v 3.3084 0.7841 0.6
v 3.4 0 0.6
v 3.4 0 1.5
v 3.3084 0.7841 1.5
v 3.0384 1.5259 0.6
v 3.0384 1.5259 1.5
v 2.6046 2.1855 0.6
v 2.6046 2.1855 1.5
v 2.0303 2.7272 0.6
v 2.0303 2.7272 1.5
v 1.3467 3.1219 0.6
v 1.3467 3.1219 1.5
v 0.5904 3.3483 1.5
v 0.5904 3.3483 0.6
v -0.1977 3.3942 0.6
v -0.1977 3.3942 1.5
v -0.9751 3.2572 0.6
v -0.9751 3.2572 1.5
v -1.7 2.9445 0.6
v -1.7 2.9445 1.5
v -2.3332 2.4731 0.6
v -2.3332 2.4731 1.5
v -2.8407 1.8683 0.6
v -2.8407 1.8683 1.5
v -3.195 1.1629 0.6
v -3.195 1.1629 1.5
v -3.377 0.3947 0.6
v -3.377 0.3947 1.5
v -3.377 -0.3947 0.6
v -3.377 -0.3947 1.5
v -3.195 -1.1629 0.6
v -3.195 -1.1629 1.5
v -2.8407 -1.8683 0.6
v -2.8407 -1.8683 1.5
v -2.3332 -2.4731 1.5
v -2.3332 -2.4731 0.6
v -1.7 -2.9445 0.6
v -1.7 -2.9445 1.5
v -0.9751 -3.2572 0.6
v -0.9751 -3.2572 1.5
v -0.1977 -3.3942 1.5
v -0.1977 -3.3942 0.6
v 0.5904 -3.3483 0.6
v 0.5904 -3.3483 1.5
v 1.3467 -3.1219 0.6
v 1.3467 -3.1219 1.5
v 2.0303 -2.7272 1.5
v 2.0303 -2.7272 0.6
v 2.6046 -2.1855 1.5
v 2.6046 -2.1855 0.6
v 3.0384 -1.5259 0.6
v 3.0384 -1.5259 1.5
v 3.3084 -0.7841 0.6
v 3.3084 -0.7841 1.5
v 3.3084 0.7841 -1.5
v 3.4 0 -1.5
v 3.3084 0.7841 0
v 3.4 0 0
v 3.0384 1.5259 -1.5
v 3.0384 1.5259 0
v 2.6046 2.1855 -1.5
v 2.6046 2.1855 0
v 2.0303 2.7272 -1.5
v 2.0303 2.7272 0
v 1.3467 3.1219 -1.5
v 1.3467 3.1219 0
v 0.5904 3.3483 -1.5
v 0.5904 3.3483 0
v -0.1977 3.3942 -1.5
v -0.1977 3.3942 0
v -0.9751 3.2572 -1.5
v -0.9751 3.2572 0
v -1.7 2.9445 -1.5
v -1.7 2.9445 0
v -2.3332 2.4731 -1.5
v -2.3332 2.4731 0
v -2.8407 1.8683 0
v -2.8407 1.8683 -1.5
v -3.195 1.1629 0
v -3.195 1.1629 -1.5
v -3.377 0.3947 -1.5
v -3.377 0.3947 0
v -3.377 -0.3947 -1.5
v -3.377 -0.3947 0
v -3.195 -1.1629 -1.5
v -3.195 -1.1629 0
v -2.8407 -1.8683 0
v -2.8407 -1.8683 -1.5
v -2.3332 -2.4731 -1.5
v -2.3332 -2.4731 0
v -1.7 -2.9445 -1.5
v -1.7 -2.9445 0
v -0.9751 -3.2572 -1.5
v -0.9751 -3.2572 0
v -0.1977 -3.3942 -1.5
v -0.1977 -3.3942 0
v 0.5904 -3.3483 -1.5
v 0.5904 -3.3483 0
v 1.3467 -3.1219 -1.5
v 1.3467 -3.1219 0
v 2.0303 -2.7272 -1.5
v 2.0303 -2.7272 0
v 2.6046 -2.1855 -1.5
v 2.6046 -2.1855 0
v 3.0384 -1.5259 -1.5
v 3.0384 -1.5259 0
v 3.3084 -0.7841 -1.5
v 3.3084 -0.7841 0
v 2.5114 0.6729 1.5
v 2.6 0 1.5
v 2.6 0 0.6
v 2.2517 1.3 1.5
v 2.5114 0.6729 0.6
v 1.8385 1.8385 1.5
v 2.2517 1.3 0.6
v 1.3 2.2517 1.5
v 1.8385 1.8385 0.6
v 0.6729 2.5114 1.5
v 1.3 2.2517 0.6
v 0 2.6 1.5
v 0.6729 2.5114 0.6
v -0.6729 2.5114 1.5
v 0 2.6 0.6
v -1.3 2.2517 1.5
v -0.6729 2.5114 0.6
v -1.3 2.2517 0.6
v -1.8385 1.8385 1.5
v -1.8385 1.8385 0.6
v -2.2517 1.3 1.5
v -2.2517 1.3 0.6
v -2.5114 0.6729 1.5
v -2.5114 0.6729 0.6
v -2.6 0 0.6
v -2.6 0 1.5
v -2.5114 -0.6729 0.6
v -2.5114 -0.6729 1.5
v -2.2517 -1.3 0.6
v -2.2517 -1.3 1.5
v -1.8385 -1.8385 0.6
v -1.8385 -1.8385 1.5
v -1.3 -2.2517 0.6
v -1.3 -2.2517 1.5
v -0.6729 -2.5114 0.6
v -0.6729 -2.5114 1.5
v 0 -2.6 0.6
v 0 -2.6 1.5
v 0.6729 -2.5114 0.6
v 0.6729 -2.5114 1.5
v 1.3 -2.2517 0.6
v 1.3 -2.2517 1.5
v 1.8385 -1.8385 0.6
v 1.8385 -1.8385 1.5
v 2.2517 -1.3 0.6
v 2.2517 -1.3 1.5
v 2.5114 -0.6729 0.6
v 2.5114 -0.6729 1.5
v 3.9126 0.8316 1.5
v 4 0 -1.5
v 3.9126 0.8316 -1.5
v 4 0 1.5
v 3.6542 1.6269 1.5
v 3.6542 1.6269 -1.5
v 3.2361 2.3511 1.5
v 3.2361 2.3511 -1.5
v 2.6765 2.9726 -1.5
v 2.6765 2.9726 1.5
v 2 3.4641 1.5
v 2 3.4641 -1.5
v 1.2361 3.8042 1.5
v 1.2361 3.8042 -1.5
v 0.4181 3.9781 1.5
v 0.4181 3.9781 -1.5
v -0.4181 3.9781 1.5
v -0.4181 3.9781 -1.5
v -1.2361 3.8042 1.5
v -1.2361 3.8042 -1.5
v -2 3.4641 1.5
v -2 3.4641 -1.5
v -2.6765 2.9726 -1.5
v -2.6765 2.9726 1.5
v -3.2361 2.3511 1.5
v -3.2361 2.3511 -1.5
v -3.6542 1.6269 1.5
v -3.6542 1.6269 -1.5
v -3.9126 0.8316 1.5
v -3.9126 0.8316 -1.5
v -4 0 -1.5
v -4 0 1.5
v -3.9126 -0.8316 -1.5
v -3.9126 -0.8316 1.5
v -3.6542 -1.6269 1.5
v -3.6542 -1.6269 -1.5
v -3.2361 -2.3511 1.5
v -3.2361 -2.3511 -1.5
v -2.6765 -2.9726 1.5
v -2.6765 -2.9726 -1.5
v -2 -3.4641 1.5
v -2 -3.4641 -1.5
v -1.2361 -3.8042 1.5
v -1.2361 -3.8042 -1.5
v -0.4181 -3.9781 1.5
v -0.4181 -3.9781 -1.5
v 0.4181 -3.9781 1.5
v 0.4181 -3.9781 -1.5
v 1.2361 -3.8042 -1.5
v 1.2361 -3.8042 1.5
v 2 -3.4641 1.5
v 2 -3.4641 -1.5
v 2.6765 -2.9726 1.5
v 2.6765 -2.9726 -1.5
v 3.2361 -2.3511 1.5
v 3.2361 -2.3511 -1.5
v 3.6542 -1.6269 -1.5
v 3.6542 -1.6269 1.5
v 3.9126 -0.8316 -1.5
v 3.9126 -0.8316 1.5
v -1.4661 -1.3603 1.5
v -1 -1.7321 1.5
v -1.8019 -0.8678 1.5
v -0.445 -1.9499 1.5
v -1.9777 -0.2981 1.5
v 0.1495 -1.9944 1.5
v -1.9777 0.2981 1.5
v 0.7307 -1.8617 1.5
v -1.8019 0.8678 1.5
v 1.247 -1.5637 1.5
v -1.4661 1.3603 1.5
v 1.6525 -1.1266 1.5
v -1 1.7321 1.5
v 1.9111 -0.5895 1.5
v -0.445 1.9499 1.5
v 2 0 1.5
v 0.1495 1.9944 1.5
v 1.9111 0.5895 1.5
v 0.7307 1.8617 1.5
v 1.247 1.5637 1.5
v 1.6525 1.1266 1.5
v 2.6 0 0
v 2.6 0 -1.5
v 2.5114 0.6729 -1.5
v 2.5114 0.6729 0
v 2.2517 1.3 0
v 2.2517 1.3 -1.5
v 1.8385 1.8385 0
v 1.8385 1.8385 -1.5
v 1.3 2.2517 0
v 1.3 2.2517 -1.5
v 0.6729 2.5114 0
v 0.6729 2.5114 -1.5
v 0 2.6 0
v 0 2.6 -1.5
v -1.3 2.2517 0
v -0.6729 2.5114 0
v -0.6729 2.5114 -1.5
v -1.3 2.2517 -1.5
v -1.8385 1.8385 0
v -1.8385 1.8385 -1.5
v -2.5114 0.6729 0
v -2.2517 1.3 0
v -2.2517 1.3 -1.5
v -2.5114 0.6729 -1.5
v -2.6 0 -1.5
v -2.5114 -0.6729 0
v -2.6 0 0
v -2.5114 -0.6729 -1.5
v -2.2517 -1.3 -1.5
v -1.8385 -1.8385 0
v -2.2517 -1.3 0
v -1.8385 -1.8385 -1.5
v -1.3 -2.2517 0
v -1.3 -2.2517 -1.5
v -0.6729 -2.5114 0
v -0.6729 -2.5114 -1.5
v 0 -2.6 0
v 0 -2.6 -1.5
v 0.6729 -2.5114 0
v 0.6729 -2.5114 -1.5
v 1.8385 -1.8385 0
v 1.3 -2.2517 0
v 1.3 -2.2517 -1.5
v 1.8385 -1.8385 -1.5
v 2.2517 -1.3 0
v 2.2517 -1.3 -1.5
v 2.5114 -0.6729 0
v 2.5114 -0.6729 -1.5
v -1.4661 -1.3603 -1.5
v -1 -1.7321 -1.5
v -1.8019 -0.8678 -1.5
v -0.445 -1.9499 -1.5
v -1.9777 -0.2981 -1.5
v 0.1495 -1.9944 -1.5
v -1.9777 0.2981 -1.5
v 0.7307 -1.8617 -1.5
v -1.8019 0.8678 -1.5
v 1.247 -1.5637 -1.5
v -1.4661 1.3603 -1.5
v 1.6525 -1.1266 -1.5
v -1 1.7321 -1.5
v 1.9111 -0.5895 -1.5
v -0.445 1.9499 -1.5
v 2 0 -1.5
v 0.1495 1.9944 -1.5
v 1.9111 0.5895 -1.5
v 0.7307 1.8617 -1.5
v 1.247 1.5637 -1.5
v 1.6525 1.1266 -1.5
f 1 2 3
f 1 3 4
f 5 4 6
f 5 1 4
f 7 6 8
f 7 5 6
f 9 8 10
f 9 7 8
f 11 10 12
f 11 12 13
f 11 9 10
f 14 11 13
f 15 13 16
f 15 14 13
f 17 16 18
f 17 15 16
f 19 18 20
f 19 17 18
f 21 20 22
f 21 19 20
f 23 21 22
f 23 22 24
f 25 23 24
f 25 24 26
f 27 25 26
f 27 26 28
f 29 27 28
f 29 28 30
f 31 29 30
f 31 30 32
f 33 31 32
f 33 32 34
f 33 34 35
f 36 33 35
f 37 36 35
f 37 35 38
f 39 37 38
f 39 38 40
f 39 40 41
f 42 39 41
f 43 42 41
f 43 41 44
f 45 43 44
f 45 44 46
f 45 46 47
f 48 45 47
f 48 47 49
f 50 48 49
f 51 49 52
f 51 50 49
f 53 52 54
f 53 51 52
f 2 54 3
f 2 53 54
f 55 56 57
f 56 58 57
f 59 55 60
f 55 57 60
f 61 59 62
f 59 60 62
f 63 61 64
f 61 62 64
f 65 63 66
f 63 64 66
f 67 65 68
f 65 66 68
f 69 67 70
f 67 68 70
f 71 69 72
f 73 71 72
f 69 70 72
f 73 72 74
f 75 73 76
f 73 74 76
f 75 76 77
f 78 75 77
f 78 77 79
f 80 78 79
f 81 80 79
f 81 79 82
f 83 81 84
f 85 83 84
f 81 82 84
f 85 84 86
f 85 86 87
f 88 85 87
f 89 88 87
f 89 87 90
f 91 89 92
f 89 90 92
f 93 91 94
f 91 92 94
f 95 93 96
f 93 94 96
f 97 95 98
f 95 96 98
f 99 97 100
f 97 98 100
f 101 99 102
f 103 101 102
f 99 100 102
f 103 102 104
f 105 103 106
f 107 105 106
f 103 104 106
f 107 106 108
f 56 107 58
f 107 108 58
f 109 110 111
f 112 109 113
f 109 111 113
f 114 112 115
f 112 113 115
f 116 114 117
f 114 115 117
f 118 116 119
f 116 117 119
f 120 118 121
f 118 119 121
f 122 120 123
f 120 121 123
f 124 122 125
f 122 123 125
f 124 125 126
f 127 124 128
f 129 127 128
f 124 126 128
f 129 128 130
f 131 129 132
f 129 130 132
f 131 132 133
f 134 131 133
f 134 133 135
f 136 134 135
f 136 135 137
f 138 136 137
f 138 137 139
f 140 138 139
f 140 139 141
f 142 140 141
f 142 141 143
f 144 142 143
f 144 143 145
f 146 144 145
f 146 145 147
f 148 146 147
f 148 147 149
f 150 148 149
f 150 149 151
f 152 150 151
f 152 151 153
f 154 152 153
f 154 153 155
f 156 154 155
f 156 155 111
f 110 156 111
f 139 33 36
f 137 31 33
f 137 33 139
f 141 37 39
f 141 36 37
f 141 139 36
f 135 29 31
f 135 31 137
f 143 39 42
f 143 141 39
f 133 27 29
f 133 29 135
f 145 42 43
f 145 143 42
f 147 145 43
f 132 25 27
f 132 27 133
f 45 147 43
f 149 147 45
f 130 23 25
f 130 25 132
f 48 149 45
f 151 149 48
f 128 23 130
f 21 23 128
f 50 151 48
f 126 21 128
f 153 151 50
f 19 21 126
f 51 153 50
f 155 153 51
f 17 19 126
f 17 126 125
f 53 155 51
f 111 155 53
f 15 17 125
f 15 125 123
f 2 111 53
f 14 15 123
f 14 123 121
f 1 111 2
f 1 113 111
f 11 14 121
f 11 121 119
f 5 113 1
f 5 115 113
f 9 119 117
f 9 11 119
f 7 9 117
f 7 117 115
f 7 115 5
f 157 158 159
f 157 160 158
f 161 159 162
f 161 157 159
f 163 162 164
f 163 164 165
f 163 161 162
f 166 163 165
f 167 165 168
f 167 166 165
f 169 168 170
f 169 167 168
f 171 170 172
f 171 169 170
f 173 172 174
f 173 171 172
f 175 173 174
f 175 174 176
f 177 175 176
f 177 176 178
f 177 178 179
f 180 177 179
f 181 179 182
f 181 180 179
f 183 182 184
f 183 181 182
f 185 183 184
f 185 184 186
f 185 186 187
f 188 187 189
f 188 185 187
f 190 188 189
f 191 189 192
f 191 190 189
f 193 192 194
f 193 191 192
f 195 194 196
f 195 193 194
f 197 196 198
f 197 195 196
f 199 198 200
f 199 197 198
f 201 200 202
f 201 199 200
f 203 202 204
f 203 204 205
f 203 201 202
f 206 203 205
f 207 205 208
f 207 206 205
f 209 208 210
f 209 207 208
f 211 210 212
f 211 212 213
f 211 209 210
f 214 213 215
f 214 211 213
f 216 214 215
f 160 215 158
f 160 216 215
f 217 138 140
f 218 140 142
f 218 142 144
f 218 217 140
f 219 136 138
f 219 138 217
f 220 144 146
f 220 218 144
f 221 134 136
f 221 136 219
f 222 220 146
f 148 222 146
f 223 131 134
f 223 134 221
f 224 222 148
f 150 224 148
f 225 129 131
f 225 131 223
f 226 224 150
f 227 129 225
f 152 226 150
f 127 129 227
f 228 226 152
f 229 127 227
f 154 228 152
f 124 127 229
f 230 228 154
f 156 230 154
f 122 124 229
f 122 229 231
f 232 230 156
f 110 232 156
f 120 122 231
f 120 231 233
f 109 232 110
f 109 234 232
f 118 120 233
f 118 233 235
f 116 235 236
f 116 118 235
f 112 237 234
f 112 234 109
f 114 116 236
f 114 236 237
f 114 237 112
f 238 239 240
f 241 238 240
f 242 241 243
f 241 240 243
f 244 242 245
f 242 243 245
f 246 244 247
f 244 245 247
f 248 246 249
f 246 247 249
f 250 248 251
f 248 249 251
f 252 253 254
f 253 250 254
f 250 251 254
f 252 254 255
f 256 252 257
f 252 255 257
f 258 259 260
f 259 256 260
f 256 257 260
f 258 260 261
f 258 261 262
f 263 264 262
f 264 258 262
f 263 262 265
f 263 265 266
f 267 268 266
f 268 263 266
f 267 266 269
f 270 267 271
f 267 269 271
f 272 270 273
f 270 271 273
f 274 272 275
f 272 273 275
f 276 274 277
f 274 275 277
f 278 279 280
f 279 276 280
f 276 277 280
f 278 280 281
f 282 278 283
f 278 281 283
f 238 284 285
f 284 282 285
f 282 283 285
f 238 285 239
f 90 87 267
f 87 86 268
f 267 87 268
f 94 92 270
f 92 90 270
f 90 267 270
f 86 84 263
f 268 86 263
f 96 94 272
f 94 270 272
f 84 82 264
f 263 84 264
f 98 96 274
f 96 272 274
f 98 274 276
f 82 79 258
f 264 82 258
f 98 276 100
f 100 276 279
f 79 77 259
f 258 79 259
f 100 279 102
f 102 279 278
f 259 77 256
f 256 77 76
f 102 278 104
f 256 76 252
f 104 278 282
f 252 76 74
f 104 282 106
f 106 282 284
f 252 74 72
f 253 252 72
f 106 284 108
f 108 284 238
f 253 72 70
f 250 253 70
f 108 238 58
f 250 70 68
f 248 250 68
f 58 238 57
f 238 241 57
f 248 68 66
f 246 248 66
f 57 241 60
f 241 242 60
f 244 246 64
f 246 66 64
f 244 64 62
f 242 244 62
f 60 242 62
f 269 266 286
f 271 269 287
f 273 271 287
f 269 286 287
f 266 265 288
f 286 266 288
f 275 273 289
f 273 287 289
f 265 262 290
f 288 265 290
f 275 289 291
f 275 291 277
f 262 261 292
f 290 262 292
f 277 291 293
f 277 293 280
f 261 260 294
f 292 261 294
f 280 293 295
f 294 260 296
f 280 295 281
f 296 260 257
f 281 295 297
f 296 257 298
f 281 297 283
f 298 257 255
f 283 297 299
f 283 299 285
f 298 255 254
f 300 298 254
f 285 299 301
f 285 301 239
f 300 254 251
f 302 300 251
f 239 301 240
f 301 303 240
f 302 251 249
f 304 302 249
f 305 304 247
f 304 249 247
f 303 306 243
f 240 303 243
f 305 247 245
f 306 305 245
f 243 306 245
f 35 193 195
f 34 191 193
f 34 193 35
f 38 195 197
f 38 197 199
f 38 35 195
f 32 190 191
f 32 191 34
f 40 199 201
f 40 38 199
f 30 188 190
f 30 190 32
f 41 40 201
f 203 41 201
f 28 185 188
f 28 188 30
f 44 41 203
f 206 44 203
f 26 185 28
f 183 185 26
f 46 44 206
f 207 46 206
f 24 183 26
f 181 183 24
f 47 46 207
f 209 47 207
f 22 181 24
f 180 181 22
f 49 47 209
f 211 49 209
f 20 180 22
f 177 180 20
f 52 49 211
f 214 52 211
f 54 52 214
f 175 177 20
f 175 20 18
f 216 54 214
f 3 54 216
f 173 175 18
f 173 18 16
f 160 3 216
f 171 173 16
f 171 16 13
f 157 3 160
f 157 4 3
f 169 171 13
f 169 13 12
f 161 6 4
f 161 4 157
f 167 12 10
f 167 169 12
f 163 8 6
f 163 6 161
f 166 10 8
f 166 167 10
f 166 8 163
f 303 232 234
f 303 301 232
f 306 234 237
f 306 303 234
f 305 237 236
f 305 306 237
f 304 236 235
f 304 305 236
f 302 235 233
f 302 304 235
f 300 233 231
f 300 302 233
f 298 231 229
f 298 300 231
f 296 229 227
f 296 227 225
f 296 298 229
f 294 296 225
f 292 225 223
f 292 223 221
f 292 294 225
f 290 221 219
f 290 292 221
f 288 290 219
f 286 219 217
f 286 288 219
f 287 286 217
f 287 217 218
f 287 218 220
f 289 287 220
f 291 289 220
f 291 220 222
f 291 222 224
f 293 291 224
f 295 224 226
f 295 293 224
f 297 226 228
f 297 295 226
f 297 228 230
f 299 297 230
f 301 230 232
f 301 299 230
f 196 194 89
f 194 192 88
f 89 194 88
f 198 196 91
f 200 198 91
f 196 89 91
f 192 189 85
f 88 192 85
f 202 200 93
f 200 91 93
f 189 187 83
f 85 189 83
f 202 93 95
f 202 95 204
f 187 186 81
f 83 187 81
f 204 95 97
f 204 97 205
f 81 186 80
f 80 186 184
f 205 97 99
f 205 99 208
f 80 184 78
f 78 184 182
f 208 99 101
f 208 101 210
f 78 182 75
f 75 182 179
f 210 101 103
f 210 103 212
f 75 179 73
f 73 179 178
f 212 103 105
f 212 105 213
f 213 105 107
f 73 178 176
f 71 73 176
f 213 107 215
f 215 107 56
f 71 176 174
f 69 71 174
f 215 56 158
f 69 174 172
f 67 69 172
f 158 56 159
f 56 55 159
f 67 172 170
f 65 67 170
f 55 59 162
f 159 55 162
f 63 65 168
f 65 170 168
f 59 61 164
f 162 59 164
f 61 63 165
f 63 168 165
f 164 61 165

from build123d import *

# Parameters (mm, degrees)
F0_R     = 4
F0_R_2   = 2
F1_DEPTH = 1.5
F2_T     = -0.6
F3_DEPTH = 1.5
F4_T     = 0.6


# Not quite as in the source:
# - a shell that OpenCascade refuses in one call is made with other operations: the cavity is built on its own and cut out


with BuildPart() as f1:
    # F0 (on Top) → F1 (new body)
    with BuildSketch(Plane.XY):
        Circle(F0_R)
        Circle(F0_R_2, mode=Mode.SUBTRACT)
    extrude(amount=F1_DEPTH)

    # F2
    f2_openings = [f1.faces().sort_by_distance(p)[0] for p in [
        (-3.886863, 0, 1.5),
    ]]
    offset(amount=F2_T, openings=f2_openings)

    # F3 (add): a face of the model
    f3_faces = [f1.faces().sort_by_distance(p)[0] for p in [
        (-3.886862915, 0, 0),
    ]]
    extrude(f3_faces, amount=F3_DEPTH)

    # F4: shell of thickness 0.6, made by hand


with BuildPart() as f4_core1:
    # F4_t2: copy of F1
    add(f1.part)

    # the walls: a layer under each face that stays
    f4_faces = [f4_core1.faces().sort_by_distance(p)[0] for p in [
        (-4, 0, 0.75),
        (-4, 0, -0.75),
        (-2.6666666667, -2.6666666667, 1.5),
        (-3.4, 0, 1.05),
        (-2, 0, -0.75),
        (-2.2666666667, -2.2666666667, 0.6),
        (-2, 0, 0.75),
        (-2.6, 0, 1.05),
        (-1.7333333333, -1.7333333333, 1.5),
    ]]
    thicken(f4_faces, amount=-F4_T, mode=Mode.SUBTRACT)

    # F4_s3 → F4_t4 (revolve, cut)
    with BuildSketch(Plane.XZ):
        Polygon((3.394, 0.606), (4, 0.6), (4, 0), (3.4, 0), align=None)
    revolve(axis=Axis((0, 0, 0.6), (0, 0, -1)), mode=Mode.SUBTRACT)

    # F4_s5 → F4_t6 (revolve, cut)
    with BuildSketch(Plane.XZ):
        Polygon((2.606, 0.606), (2.6, 0), (2, 0), (2, 0.6), align=None)
    revolve(axis=Axis((0, 0, 0.6), (0, 0, -1)), mode=Mode.SUBTRACT)


with BuildPart() as f1_1:
    add(f1.part)

    # what is left inside the walls is the cavity
    f4_cavity = [f4_core1.part.solids().sort_by_distance(p)[0] for p in [
        (-3.394, 0, -1),
    ]]
    add(f4_cavity, mode=Mode.SUBTRACT)


solid = f1_1.part
